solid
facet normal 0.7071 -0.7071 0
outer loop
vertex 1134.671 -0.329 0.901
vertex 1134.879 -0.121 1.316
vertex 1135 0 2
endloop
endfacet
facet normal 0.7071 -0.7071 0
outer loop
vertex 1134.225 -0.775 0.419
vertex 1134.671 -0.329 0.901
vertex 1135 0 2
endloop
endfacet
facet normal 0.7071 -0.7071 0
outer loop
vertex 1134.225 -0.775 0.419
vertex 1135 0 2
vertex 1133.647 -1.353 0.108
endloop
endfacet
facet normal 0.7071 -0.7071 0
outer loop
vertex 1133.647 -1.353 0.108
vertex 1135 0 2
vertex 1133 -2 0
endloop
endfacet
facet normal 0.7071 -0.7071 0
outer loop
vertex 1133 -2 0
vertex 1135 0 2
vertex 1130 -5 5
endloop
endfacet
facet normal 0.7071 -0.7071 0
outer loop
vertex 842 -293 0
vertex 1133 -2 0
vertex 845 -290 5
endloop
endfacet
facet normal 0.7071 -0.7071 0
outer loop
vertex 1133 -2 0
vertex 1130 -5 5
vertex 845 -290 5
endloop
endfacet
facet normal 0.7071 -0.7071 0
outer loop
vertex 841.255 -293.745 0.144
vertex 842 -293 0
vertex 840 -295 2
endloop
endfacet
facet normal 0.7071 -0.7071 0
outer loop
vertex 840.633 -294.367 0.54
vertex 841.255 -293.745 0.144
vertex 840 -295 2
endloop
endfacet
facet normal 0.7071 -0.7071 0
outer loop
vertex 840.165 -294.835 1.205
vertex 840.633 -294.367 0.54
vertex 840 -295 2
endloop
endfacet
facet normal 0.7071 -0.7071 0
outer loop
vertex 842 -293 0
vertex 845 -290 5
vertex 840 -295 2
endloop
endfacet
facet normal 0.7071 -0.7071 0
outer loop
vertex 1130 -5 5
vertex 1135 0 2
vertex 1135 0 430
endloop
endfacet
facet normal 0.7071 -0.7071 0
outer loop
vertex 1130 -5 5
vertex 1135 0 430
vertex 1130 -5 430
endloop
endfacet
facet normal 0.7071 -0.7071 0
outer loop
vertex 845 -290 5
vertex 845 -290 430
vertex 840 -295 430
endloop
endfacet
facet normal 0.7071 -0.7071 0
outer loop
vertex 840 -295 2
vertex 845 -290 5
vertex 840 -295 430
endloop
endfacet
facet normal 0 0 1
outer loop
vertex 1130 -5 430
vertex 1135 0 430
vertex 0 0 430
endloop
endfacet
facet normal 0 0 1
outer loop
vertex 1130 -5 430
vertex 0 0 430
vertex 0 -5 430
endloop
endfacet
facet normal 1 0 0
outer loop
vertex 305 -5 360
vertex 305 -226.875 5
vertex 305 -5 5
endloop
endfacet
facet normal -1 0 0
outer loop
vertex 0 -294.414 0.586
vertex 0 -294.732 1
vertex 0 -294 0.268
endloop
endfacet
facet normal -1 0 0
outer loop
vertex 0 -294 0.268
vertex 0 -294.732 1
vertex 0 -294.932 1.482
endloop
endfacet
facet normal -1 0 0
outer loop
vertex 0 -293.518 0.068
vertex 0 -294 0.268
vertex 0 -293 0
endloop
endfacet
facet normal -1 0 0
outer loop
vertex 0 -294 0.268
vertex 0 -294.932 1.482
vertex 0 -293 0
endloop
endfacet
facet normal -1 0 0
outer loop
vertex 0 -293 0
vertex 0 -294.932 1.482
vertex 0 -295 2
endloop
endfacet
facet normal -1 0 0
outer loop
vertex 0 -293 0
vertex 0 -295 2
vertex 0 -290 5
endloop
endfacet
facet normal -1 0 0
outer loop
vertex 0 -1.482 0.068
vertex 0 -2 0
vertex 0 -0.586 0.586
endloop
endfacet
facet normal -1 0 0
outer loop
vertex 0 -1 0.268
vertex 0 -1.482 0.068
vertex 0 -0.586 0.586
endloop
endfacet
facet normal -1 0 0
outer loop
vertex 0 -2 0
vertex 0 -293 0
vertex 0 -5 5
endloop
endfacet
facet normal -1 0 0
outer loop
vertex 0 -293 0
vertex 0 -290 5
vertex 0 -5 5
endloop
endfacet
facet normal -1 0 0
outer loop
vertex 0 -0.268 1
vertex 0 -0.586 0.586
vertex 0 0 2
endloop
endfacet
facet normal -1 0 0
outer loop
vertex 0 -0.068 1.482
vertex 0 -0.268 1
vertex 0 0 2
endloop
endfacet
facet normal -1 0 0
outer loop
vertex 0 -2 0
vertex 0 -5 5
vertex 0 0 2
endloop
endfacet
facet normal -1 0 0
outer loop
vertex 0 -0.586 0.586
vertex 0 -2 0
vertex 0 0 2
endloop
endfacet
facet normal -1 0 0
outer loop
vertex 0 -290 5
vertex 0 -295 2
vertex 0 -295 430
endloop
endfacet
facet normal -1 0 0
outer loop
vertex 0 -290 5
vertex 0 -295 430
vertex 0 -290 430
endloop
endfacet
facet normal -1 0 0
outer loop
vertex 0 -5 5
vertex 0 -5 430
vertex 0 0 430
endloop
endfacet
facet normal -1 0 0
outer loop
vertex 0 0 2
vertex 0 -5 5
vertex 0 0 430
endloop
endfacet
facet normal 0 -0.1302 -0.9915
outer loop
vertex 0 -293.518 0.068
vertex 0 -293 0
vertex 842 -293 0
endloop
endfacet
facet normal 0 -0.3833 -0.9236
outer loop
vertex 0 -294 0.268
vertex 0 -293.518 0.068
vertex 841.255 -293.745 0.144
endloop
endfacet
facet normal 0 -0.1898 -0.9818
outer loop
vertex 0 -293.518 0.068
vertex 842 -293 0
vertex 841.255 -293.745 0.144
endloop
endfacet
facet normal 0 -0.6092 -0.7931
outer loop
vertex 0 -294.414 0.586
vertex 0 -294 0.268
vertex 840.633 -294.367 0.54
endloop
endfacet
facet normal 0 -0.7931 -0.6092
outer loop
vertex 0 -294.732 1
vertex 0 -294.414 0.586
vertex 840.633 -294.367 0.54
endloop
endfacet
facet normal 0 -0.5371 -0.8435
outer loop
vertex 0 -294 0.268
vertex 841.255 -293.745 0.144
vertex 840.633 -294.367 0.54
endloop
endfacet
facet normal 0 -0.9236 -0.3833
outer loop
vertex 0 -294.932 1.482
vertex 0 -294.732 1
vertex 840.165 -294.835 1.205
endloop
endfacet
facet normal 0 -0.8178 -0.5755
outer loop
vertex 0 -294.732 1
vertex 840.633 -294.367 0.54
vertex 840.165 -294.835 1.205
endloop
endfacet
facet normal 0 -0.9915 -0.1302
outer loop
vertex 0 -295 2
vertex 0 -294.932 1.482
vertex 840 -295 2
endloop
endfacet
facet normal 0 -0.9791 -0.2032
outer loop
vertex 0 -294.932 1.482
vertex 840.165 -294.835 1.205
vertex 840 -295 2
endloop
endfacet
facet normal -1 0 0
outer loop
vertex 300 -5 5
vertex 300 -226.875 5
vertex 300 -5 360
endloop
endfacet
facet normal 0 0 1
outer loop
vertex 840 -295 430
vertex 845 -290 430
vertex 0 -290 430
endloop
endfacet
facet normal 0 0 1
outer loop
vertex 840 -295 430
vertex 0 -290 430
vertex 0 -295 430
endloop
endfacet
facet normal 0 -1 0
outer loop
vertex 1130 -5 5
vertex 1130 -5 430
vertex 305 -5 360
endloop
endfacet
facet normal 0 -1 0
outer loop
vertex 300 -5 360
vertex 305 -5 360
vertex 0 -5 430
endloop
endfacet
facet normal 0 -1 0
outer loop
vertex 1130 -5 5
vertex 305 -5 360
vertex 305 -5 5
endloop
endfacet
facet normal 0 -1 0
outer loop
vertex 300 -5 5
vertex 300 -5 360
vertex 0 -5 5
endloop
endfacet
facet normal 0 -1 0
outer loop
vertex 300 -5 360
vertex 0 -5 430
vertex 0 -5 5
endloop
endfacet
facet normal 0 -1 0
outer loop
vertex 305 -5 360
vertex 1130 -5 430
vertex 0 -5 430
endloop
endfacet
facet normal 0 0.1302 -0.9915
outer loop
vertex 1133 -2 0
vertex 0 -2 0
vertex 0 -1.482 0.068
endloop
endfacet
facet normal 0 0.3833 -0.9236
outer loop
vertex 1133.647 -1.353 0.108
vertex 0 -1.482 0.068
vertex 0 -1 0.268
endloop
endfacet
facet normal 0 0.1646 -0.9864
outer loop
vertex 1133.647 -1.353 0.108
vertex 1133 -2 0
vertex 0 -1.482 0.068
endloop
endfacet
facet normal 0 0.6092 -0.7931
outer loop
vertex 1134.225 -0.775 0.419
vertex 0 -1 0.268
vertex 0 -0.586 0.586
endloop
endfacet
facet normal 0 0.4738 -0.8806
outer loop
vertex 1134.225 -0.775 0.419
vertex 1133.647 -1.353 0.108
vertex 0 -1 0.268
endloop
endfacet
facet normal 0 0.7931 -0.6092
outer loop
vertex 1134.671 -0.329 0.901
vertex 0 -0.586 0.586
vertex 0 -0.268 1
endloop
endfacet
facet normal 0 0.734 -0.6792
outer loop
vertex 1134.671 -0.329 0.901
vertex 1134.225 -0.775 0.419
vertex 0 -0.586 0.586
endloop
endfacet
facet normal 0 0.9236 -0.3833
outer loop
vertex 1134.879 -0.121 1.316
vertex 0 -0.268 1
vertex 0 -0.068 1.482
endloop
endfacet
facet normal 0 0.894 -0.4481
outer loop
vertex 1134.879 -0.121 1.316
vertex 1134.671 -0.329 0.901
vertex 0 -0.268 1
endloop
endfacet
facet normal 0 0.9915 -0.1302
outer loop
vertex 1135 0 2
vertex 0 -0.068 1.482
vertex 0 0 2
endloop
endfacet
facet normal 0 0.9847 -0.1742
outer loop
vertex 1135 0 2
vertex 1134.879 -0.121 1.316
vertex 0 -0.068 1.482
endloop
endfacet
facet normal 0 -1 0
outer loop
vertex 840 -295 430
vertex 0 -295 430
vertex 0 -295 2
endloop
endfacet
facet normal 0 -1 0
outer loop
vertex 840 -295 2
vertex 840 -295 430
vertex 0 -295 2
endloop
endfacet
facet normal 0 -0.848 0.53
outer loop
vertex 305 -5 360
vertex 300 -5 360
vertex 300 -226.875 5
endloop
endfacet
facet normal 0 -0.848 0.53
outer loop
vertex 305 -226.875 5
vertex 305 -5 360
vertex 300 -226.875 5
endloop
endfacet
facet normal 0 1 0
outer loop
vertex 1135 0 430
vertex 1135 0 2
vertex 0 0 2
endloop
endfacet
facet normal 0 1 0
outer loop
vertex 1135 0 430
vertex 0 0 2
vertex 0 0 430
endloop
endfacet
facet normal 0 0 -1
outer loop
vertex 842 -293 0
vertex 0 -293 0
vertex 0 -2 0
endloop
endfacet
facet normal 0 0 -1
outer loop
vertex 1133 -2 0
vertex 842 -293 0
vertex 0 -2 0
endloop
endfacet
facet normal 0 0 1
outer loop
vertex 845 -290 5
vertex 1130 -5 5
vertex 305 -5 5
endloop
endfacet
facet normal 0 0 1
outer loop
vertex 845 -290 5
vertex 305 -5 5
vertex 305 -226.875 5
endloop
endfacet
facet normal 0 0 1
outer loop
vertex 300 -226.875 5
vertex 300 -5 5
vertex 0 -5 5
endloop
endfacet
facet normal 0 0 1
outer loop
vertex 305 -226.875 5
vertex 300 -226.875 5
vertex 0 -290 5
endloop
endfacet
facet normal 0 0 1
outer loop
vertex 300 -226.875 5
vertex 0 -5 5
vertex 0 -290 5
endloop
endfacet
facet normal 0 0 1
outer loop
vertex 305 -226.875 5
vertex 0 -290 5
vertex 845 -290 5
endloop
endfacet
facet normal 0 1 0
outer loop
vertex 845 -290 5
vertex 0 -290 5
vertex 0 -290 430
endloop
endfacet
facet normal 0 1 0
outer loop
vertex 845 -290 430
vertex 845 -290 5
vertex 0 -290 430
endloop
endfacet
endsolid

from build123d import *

# Parameters (mm, degrees)
F1_DEPTH = 1200
F4_DEPTH = 5
F5_W     = 1200
F5_H     = 230
F6_DEPTH = 4
F7_R     = 2
F9_DEPTH = 430.001


# Not quite as in the source:
# - a feature names something its author has since deleted; it is built from what else it names


with BuildPart() as f1:
    # F0 (on Right) → F1 (new body)
    with BuildSketch(Plane.YZ):
        Polygon((-295, 0), (0, 0), (0, 430), (-5, 430), (-5, 5), (-290, 5), (-290, 430), (-295, 430), align=None)
    extrude(amount=F1_DEPTH)



with BuildPart() as f4:
    # F3 (on offset) → F4 (new body)
    with BuildSketch(Plane.YZ.offset(300)):
        Polygon((-230, 0), (-5, 0), (-5, 360), align=None)
    extrude(amount=F4_DEPTH)


with BuildPart() as f1_1:
    add(f1.part)

    add(f4.part)  # F6 merges F4
    # F5 (on Top) → F6 (join)
    with BuildSketch(Plane.XY):
        with Locations((600, -115)):
            Rectangle(F5_W, F5_H)
    extrude(amount=F6_DEPTH)

    # F7
    f7_edges = [f1_1.edges().sort_by_distance(p)[0] for p in [
        (600, 0, 0),
        (600, -295, 0),
    ]]
    fillet(f7_edges, radius=F7_R)

    # F8 (on face) → F9 (cut, through all)
    with BuildSketch(Plane.XY.offset(430)):
        Polygon((1135, 0), (840, -295), (1200, -295), (1200, 0), align=None)
    extrude(amount=-F9_DEPTH, mode=Mode.SUBTRACT)


solid = f1_1.part
